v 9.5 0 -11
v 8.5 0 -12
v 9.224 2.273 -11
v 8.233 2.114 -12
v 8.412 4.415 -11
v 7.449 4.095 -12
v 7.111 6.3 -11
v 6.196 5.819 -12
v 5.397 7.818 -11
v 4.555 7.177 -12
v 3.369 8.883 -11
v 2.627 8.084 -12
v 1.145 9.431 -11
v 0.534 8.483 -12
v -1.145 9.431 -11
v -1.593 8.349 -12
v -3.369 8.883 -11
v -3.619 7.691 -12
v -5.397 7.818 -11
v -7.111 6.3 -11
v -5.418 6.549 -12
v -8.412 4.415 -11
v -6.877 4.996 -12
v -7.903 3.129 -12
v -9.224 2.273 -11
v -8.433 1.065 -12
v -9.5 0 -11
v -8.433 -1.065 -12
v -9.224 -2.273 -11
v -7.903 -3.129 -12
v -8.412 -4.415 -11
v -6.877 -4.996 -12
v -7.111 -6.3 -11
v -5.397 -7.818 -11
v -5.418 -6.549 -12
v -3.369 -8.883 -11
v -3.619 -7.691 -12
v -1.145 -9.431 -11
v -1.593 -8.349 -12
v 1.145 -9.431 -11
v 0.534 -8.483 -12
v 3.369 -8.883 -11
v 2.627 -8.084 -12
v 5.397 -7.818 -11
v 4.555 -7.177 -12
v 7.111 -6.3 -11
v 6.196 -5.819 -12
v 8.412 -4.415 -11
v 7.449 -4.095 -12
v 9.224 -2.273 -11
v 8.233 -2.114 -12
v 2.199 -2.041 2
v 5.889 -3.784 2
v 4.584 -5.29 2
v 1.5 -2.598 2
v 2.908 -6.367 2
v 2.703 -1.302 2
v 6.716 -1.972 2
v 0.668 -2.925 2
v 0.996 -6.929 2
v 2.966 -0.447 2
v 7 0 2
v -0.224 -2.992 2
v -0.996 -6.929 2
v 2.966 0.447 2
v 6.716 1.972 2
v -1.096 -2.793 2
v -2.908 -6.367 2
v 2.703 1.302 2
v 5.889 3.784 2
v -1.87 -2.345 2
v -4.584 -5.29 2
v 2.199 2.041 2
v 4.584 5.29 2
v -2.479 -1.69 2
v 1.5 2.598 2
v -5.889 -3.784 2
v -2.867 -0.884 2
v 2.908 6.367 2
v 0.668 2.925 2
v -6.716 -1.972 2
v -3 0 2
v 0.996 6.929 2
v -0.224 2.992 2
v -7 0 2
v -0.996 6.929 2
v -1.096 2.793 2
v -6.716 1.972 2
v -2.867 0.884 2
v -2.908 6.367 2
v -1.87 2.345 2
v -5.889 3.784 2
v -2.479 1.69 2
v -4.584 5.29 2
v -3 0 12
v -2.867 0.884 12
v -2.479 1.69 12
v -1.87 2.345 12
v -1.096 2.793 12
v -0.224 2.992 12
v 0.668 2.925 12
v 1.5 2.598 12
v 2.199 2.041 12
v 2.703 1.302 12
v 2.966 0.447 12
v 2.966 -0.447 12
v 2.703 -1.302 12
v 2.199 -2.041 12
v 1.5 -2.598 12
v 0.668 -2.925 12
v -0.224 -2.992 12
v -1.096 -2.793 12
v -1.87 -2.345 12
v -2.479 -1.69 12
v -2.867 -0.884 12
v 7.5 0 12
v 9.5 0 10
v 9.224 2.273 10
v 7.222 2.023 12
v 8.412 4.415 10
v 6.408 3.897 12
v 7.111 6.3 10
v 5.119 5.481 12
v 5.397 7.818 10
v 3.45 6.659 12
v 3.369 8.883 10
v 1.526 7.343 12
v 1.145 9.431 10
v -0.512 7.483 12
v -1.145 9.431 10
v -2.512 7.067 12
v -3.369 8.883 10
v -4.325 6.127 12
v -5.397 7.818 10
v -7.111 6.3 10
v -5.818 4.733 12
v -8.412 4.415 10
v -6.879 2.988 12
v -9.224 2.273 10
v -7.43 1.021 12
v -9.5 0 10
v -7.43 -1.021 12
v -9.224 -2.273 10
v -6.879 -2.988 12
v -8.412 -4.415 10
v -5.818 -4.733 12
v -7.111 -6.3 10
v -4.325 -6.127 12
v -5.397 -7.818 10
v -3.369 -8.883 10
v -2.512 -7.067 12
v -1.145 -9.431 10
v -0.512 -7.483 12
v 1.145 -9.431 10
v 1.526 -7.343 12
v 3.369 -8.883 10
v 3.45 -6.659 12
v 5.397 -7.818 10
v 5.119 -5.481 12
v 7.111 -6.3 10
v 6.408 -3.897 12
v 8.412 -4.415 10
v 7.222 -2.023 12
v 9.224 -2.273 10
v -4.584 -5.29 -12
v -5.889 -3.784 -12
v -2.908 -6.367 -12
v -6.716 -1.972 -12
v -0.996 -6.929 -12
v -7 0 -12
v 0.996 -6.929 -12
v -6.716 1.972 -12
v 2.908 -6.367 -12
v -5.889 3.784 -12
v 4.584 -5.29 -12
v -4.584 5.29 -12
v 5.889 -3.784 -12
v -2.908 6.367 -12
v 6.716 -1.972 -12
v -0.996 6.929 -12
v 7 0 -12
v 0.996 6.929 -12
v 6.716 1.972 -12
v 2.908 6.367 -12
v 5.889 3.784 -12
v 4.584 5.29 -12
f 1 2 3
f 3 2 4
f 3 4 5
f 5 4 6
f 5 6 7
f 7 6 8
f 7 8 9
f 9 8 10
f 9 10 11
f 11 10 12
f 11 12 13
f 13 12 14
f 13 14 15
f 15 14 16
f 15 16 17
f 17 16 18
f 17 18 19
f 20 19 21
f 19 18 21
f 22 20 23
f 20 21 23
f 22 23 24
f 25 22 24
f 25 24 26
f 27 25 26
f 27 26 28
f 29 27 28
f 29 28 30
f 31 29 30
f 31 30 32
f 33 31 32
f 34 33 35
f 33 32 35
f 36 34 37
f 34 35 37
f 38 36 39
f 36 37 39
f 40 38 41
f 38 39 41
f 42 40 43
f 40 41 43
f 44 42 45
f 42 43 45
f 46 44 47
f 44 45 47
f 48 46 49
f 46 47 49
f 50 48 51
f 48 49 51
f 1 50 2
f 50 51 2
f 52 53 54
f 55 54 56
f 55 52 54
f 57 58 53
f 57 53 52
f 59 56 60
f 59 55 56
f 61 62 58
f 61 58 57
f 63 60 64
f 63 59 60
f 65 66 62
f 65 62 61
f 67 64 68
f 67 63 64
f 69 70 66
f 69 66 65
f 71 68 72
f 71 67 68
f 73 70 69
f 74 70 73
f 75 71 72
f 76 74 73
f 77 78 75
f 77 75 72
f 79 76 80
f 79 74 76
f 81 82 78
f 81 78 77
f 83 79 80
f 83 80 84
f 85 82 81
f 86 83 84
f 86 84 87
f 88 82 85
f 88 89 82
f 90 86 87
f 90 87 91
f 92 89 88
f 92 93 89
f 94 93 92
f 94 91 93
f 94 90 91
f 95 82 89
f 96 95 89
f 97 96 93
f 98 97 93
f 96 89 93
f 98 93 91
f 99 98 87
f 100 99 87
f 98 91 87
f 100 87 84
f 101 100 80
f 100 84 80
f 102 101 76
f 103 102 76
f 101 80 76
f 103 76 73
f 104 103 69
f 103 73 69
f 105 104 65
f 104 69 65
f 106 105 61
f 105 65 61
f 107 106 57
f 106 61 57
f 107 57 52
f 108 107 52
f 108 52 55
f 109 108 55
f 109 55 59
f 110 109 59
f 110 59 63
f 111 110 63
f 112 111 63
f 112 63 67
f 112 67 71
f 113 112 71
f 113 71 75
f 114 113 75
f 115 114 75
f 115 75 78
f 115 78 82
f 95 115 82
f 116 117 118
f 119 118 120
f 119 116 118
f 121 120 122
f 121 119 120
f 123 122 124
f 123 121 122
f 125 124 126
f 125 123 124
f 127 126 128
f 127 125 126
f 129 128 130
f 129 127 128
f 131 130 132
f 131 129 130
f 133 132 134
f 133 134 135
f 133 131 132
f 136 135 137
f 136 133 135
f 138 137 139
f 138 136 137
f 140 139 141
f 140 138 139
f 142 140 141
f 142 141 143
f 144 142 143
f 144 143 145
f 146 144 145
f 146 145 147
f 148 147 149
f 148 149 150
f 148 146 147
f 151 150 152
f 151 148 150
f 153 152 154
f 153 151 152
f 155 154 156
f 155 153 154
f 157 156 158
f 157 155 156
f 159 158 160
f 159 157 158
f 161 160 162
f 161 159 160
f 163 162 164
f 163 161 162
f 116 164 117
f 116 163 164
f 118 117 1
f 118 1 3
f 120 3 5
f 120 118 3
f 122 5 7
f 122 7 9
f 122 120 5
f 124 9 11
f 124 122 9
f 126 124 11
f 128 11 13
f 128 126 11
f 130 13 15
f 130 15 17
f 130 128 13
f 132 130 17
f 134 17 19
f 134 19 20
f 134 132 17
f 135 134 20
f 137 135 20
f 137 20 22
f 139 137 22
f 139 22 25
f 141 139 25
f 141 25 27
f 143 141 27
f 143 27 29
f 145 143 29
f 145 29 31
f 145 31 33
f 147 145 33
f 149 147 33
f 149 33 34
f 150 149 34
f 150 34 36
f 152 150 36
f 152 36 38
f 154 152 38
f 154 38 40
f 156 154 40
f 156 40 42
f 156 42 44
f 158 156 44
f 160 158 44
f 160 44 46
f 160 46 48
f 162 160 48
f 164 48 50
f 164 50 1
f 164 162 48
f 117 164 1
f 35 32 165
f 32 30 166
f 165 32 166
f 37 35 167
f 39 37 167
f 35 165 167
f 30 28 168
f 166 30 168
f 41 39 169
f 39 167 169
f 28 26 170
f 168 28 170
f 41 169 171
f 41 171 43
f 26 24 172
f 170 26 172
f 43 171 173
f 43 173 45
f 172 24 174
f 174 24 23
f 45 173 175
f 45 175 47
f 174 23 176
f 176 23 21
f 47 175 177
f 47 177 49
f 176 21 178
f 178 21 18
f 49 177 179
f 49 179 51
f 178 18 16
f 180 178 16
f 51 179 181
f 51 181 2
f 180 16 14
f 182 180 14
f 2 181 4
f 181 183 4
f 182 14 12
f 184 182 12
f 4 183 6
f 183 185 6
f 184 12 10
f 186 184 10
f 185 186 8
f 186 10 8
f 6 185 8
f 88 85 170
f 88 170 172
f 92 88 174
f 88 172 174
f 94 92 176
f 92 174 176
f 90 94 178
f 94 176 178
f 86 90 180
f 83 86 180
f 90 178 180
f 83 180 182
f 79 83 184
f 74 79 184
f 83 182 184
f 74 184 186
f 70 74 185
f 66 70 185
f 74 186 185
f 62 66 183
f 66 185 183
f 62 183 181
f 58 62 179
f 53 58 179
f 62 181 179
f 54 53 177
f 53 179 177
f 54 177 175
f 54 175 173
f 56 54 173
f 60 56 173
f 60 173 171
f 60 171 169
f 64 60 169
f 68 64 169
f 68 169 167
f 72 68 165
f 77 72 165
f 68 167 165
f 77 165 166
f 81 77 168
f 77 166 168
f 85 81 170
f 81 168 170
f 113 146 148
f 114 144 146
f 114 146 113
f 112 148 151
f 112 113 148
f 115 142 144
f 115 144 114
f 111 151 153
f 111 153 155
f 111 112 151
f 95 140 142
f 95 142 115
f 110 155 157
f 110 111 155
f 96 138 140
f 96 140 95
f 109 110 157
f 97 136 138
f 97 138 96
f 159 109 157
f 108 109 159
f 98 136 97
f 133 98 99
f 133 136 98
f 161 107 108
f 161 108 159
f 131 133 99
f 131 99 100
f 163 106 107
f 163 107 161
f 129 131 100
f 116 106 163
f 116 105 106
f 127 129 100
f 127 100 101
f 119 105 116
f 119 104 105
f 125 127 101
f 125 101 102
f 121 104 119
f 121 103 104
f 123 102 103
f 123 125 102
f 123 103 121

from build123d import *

# Parameters (mm, degrees)
SKETCH1_R           = 9.5
BOSS_EXTRUDE1_DEPTH = 12
CHAMFER1_SIZE       = 2
CHAMFER2_SIZE       = 1
SKETCH2_R           = 7
CUT_EXTRUDE1_DEPTH  = 14
SKETCH3_R           = 3
CUT_EXTRUDE2_DEPTH  = 14


with BuildPart() as part:
    # Sketch1 → Boss-Extrude1 (new, symmetric)
    with BuildSketch(Plane.XY):
        Circle(SKETCH1_R)
    extrude(amount=BOSS_EXTRUDE1_DEPTH, both=True)

    # Chamfer1
    chamfer1_edges = [part.edges().sort_by_distance(p)[0] for p in [
        (-9.5, 0, 12),
    ]]
    chamfer(chamfer1_edges, length=CHAMFER1_SIZE)

    # Chamfer2
    chamfer2_edges = [part.edges().sort_by_distance(p)[0] for p in [
        (-9.5, 0, -12),
    ]]
    chamfer(chamfer2_edges, length=CHAMFER2_SIZE)

    # Sketch2 → Cut-Extrude1 (cut)
    with BuildSketch(Plane(origin=(0, 0, -12), x_dir=(-1, 0, 0), z_dir=(0, 0, -1))):
        Circle(SKETCH2_R)
    extrude(amount=-CUT_EXTRUDE1_DEPTH, mode=Mode.SUBTRACT)

    # Sketch3 → Cut-Extrude2 (cut)
    with BuildSketch(Plane(origin=(0, 0, 2), x_dir=(-1, 0, 0), z_dir=(0, 0, -1))):
        Circle(SKETCH3_R)
    extrude(amount=-CUT_EXTRUDE2_DEPTH, mode=Mode.SUBTRACT)


solid = part.part
